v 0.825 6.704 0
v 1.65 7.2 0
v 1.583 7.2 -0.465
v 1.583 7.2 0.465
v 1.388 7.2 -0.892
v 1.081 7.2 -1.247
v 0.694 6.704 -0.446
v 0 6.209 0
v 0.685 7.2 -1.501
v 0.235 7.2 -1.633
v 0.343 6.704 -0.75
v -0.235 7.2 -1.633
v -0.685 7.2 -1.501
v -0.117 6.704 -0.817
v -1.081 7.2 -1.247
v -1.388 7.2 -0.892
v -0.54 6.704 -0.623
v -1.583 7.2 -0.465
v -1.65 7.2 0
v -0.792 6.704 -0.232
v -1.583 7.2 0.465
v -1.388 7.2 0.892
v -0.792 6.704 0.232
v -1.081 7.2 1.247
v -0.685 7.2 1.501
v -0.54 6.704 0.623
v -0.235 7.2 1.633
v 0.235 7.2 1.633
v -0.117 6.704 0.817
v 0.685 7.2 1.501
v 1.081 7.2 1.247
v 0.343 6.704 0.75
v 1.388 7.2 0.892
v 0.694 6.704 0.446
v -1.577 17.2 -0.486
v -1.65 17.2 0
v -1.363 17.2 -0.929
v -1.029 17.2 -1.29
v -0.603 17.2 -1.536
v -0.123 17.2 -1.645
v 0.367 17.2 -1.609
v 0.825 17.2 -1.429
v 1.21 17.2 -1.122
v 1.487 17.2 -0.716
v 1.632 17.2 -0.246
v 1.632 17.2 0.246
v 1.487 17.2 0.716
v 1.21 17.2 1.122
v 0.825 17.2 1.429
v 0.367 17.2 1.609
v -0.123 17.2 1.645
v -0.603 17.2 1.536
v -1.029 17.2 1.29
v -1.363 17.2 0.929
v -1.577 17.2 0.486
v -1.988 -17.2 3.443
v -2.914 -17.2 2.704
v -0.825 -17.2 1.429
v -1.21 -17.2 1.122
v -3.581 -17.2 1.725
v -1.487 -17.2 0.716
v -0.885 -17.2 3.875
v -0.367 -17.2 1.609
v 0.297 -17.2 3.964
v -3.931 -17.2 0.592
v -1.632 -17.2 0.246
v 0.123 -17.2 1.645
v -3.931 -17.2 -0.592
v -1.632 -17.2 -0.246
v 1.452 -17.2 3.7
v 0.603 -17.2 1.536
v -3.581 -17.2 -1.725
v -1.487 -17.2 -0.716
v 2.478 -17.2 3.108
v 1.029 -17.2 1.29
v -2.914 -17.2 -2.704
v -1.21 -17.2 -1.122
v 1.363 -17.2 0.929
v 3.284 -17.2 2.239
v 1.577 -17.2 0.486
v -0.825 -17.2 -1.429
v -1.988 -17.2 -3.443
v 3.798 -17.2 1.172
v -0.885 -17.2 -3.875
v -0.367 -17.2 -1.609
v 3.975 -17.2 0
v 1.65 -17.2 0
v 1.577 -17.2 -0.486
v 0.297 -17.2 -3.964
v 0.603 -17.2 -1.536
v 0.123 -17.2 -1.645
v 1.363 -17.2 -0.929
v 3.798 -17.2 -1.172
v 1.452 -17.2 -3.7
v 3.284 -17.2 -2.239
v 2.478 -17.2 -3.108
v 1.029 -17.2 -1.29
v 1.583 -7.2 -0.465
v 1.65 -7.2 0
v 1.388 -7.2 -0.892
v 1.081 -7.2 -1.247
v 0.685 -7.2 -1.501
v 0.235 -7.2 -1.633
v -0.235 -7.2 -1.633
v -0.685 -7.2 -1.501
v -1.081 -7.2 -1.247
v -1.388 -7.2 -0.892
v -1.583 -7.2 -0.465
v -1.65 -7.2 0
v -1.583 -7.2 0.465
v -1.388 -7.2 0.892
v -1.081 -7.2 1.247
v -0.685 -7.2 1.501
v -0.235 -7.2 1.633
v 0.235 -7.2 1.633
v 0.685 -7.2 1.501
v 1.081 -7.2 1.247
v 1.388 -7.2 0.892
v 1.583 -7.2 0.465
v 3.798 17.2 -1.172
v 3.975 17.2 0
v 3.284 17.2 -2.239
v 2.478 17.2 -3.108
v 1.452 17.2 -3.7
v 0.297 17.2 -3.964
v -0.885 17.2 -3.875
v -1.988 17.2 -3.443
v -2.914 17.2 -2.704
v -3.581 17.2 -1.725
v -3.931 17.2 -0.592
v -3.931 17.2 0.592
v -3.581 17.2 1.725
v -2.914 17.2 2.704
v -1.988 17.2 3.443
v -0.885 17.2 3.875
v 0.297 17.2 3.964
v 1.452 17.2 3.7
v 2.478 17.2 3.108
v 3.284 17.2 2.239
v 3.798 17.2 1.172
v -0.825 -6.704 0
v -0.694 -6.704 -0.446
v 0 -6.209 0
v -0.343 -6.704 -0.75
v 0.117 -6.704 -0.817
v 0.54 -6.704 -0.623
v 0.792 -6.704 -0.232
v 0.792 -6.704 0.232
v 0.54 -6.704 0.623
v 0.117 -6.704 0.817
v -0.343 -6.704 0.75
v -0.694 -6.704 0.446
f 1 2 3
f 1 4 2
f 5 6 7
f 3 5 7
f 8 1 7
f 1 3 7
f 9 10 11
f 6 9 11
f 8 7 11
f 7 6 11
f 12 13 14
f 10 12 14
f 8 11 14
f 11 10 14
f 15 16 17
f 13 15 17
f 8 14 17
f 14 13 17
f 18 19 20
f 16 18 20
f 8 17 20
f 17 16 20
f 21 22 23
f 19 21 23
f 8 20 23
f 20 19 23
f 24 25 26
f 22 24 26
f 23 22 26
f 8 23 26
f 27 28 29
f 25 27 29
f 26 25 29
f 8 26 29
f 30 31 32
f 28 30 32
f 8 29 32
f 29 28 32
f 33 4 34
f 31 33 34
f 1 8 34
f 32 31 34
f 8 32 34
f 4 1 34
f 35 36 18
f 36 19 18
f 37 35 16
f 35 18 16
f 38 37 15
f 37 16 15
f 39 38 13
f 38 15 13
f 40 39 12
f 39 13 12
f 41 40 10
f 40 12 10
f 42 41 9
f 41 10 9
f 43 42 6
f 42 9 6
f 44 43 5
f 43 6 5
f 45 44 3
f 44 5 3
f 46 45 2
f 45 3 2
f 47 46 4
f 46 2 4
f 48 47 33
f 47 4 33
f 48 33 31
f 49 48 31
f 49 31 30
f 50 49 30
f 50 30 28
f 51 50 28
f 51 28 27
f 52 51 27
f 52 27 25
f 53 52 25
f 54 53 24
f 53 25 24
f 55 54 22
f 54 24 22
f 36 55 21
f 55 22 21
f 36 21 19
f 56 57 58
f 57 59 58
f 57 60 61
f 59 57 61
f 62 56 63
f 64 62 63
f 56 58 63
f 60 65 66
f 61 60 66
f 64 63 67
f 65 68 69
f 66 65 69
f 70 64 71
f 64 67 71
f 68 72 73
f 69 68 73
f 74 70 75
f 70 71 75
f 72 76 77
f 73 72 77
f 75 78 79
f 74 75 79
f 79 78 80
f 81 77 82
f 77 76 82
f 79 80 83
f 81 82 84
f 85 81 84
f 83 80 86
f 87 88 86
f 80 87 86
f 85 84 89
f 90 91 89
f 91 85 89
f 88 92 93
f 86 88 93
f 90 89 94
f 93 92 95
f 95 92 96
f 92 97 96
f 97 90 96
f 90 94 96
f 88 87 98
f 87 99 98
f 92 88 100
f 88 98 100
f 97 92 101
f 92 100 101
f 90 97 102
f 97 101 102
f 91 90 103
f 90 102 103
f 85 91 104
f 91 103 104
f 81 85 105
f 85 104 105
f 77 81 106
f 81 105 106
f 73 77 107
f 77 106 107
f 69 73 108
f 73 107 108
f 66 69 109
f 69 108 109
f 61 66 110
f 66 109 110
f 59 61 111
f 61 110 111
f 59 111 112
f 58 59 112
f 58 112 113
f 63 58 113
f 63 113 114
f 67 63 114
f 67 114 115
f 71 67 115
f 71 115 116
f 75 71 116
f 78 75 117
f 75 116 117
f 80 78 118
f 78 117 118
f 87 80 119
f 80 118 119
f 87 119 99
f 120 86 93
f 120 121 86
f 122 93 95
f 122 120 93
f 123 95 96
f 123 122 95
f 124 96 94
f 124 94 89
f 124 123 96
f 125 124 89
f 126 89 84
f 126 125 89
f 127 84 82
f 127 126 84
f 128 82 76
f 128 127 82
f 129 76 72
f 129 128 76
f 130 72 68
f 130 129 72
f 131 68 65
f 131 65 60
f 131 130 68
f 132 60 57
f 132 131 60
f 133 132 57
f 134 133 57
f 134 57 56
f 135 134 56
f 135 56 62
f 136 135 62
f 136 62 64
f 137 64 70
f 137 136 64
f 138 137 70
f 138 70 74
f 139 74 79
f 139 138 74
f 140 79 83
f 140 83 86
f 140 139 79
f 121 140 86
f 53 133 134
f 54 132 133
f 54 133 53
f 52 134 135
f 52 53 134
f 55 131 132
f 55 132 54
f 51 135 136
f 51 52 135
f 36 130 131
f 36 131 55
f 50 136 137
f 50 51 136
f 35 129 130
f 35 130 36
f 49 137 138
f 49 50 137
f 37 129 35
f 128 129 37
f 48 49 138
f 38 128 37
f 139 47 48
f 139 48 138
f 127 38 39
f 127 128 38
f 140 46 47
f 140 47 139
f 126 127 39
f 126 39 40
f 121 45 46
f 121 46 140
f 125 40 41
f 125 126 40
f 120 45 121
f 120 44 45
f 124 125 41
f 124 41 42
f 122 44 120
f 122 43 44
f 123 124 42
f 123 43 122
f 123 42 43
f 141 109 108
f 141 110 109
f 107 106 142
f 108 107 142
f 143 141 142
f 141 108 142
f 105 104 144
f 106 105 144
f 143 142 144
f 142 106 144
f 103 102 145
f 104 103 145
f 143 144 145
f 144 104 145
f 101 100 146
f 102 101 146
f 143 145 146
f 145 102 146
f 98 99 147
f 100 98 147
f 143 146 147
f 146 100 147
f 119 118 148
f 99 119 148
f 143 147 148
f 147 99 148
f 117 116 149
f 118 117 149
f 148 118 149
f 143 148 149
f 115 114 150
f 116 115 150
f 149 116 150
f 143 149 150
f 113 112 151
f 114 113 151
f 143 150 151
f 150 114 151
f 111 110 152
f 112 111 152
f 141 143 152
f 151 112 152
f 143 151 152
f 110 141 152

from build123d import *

# Parameters (mm, degrees)
SKETCH2_R                 = 3.9751
BOSS_EXTRUDE1_DEPTH       = 17.2
M4X0_7_TAPPED_HOLE1_D     = 3.3
M4X0_7_TAPPED_HOLE1_DEPTH = 10
M4X0_7_TAPPED_HOLE1_TIP   = 0.991420021
M4X0_7_TAPPED_HOLE2_D     = 3.3
M4X0_7_TAPPED_HOLE2_DEPTH = 10
M4X0_7_TAPPED_HOLE2_TIP   = 0.991420021


with BuildPart() as part:
    # Sketch2 → Boss-Extrude1 (new body, symmetric)
    with BuildSketch(Plane(origin=(0, 0, 0), x_dir=(1, 0, 0), z_dir=(0, 1, 0))):
        Circle(SKETCH2_R)
    extrude(amount=BOSS_EXTRUDE1_DEPTH, both=True)

    # M4x0.7 Tapped Hole1
    with Locations(Plane(origin=(0, 17.2, 0), x_dir=(1, 0, 0), z_dir=(0, 1, 0))):
        with Locations((0, 0)):
            Hole(M4X0_7_TAPPED_HOLE1_D / 2, depth=M4X0_7_TAPPED_HOLE1_DEPTH)
            with Locations((0, 0, -(M4X0_7_TAPPED_HOLE1_DEPTH + M4X0_7_TAPPED_HOLE1_TIP / 2))):  # 118° drill point
                Cone(0, M4X0_7_TAPPED_HOLE1_D / 2, M4X0_7_TAPPED_HOLE1_TIP, mode=Mode.SUBTRACT)

    # M4x0.7 Tapped Hole2
    with Locations(Plane(origin=(0, -17.2, 0), x_dir=(-1, 0, 0), z_dir=(0, -1, 0))):
        with Locations((0, 0)):
            Hole(M4X0_7_TAPPED_HOLE2_D / 2, depth=M4X0_7_TAPPED_HOLE2_DEPTH)
            with Locations((0, 0, -(M4X0_7_TAPPED_HOLE2_DEPTH + M4X0_7_TAPPED_HOLE2_TIP / 2))):  # 118° drill point
                Cone(0, M4X0_7_TAPPED_HOLE2_D / 2, M4X0_7_TAPPED_HOLE2_TIP, mode=Mode.SUBTRACT)


solid = part.part
